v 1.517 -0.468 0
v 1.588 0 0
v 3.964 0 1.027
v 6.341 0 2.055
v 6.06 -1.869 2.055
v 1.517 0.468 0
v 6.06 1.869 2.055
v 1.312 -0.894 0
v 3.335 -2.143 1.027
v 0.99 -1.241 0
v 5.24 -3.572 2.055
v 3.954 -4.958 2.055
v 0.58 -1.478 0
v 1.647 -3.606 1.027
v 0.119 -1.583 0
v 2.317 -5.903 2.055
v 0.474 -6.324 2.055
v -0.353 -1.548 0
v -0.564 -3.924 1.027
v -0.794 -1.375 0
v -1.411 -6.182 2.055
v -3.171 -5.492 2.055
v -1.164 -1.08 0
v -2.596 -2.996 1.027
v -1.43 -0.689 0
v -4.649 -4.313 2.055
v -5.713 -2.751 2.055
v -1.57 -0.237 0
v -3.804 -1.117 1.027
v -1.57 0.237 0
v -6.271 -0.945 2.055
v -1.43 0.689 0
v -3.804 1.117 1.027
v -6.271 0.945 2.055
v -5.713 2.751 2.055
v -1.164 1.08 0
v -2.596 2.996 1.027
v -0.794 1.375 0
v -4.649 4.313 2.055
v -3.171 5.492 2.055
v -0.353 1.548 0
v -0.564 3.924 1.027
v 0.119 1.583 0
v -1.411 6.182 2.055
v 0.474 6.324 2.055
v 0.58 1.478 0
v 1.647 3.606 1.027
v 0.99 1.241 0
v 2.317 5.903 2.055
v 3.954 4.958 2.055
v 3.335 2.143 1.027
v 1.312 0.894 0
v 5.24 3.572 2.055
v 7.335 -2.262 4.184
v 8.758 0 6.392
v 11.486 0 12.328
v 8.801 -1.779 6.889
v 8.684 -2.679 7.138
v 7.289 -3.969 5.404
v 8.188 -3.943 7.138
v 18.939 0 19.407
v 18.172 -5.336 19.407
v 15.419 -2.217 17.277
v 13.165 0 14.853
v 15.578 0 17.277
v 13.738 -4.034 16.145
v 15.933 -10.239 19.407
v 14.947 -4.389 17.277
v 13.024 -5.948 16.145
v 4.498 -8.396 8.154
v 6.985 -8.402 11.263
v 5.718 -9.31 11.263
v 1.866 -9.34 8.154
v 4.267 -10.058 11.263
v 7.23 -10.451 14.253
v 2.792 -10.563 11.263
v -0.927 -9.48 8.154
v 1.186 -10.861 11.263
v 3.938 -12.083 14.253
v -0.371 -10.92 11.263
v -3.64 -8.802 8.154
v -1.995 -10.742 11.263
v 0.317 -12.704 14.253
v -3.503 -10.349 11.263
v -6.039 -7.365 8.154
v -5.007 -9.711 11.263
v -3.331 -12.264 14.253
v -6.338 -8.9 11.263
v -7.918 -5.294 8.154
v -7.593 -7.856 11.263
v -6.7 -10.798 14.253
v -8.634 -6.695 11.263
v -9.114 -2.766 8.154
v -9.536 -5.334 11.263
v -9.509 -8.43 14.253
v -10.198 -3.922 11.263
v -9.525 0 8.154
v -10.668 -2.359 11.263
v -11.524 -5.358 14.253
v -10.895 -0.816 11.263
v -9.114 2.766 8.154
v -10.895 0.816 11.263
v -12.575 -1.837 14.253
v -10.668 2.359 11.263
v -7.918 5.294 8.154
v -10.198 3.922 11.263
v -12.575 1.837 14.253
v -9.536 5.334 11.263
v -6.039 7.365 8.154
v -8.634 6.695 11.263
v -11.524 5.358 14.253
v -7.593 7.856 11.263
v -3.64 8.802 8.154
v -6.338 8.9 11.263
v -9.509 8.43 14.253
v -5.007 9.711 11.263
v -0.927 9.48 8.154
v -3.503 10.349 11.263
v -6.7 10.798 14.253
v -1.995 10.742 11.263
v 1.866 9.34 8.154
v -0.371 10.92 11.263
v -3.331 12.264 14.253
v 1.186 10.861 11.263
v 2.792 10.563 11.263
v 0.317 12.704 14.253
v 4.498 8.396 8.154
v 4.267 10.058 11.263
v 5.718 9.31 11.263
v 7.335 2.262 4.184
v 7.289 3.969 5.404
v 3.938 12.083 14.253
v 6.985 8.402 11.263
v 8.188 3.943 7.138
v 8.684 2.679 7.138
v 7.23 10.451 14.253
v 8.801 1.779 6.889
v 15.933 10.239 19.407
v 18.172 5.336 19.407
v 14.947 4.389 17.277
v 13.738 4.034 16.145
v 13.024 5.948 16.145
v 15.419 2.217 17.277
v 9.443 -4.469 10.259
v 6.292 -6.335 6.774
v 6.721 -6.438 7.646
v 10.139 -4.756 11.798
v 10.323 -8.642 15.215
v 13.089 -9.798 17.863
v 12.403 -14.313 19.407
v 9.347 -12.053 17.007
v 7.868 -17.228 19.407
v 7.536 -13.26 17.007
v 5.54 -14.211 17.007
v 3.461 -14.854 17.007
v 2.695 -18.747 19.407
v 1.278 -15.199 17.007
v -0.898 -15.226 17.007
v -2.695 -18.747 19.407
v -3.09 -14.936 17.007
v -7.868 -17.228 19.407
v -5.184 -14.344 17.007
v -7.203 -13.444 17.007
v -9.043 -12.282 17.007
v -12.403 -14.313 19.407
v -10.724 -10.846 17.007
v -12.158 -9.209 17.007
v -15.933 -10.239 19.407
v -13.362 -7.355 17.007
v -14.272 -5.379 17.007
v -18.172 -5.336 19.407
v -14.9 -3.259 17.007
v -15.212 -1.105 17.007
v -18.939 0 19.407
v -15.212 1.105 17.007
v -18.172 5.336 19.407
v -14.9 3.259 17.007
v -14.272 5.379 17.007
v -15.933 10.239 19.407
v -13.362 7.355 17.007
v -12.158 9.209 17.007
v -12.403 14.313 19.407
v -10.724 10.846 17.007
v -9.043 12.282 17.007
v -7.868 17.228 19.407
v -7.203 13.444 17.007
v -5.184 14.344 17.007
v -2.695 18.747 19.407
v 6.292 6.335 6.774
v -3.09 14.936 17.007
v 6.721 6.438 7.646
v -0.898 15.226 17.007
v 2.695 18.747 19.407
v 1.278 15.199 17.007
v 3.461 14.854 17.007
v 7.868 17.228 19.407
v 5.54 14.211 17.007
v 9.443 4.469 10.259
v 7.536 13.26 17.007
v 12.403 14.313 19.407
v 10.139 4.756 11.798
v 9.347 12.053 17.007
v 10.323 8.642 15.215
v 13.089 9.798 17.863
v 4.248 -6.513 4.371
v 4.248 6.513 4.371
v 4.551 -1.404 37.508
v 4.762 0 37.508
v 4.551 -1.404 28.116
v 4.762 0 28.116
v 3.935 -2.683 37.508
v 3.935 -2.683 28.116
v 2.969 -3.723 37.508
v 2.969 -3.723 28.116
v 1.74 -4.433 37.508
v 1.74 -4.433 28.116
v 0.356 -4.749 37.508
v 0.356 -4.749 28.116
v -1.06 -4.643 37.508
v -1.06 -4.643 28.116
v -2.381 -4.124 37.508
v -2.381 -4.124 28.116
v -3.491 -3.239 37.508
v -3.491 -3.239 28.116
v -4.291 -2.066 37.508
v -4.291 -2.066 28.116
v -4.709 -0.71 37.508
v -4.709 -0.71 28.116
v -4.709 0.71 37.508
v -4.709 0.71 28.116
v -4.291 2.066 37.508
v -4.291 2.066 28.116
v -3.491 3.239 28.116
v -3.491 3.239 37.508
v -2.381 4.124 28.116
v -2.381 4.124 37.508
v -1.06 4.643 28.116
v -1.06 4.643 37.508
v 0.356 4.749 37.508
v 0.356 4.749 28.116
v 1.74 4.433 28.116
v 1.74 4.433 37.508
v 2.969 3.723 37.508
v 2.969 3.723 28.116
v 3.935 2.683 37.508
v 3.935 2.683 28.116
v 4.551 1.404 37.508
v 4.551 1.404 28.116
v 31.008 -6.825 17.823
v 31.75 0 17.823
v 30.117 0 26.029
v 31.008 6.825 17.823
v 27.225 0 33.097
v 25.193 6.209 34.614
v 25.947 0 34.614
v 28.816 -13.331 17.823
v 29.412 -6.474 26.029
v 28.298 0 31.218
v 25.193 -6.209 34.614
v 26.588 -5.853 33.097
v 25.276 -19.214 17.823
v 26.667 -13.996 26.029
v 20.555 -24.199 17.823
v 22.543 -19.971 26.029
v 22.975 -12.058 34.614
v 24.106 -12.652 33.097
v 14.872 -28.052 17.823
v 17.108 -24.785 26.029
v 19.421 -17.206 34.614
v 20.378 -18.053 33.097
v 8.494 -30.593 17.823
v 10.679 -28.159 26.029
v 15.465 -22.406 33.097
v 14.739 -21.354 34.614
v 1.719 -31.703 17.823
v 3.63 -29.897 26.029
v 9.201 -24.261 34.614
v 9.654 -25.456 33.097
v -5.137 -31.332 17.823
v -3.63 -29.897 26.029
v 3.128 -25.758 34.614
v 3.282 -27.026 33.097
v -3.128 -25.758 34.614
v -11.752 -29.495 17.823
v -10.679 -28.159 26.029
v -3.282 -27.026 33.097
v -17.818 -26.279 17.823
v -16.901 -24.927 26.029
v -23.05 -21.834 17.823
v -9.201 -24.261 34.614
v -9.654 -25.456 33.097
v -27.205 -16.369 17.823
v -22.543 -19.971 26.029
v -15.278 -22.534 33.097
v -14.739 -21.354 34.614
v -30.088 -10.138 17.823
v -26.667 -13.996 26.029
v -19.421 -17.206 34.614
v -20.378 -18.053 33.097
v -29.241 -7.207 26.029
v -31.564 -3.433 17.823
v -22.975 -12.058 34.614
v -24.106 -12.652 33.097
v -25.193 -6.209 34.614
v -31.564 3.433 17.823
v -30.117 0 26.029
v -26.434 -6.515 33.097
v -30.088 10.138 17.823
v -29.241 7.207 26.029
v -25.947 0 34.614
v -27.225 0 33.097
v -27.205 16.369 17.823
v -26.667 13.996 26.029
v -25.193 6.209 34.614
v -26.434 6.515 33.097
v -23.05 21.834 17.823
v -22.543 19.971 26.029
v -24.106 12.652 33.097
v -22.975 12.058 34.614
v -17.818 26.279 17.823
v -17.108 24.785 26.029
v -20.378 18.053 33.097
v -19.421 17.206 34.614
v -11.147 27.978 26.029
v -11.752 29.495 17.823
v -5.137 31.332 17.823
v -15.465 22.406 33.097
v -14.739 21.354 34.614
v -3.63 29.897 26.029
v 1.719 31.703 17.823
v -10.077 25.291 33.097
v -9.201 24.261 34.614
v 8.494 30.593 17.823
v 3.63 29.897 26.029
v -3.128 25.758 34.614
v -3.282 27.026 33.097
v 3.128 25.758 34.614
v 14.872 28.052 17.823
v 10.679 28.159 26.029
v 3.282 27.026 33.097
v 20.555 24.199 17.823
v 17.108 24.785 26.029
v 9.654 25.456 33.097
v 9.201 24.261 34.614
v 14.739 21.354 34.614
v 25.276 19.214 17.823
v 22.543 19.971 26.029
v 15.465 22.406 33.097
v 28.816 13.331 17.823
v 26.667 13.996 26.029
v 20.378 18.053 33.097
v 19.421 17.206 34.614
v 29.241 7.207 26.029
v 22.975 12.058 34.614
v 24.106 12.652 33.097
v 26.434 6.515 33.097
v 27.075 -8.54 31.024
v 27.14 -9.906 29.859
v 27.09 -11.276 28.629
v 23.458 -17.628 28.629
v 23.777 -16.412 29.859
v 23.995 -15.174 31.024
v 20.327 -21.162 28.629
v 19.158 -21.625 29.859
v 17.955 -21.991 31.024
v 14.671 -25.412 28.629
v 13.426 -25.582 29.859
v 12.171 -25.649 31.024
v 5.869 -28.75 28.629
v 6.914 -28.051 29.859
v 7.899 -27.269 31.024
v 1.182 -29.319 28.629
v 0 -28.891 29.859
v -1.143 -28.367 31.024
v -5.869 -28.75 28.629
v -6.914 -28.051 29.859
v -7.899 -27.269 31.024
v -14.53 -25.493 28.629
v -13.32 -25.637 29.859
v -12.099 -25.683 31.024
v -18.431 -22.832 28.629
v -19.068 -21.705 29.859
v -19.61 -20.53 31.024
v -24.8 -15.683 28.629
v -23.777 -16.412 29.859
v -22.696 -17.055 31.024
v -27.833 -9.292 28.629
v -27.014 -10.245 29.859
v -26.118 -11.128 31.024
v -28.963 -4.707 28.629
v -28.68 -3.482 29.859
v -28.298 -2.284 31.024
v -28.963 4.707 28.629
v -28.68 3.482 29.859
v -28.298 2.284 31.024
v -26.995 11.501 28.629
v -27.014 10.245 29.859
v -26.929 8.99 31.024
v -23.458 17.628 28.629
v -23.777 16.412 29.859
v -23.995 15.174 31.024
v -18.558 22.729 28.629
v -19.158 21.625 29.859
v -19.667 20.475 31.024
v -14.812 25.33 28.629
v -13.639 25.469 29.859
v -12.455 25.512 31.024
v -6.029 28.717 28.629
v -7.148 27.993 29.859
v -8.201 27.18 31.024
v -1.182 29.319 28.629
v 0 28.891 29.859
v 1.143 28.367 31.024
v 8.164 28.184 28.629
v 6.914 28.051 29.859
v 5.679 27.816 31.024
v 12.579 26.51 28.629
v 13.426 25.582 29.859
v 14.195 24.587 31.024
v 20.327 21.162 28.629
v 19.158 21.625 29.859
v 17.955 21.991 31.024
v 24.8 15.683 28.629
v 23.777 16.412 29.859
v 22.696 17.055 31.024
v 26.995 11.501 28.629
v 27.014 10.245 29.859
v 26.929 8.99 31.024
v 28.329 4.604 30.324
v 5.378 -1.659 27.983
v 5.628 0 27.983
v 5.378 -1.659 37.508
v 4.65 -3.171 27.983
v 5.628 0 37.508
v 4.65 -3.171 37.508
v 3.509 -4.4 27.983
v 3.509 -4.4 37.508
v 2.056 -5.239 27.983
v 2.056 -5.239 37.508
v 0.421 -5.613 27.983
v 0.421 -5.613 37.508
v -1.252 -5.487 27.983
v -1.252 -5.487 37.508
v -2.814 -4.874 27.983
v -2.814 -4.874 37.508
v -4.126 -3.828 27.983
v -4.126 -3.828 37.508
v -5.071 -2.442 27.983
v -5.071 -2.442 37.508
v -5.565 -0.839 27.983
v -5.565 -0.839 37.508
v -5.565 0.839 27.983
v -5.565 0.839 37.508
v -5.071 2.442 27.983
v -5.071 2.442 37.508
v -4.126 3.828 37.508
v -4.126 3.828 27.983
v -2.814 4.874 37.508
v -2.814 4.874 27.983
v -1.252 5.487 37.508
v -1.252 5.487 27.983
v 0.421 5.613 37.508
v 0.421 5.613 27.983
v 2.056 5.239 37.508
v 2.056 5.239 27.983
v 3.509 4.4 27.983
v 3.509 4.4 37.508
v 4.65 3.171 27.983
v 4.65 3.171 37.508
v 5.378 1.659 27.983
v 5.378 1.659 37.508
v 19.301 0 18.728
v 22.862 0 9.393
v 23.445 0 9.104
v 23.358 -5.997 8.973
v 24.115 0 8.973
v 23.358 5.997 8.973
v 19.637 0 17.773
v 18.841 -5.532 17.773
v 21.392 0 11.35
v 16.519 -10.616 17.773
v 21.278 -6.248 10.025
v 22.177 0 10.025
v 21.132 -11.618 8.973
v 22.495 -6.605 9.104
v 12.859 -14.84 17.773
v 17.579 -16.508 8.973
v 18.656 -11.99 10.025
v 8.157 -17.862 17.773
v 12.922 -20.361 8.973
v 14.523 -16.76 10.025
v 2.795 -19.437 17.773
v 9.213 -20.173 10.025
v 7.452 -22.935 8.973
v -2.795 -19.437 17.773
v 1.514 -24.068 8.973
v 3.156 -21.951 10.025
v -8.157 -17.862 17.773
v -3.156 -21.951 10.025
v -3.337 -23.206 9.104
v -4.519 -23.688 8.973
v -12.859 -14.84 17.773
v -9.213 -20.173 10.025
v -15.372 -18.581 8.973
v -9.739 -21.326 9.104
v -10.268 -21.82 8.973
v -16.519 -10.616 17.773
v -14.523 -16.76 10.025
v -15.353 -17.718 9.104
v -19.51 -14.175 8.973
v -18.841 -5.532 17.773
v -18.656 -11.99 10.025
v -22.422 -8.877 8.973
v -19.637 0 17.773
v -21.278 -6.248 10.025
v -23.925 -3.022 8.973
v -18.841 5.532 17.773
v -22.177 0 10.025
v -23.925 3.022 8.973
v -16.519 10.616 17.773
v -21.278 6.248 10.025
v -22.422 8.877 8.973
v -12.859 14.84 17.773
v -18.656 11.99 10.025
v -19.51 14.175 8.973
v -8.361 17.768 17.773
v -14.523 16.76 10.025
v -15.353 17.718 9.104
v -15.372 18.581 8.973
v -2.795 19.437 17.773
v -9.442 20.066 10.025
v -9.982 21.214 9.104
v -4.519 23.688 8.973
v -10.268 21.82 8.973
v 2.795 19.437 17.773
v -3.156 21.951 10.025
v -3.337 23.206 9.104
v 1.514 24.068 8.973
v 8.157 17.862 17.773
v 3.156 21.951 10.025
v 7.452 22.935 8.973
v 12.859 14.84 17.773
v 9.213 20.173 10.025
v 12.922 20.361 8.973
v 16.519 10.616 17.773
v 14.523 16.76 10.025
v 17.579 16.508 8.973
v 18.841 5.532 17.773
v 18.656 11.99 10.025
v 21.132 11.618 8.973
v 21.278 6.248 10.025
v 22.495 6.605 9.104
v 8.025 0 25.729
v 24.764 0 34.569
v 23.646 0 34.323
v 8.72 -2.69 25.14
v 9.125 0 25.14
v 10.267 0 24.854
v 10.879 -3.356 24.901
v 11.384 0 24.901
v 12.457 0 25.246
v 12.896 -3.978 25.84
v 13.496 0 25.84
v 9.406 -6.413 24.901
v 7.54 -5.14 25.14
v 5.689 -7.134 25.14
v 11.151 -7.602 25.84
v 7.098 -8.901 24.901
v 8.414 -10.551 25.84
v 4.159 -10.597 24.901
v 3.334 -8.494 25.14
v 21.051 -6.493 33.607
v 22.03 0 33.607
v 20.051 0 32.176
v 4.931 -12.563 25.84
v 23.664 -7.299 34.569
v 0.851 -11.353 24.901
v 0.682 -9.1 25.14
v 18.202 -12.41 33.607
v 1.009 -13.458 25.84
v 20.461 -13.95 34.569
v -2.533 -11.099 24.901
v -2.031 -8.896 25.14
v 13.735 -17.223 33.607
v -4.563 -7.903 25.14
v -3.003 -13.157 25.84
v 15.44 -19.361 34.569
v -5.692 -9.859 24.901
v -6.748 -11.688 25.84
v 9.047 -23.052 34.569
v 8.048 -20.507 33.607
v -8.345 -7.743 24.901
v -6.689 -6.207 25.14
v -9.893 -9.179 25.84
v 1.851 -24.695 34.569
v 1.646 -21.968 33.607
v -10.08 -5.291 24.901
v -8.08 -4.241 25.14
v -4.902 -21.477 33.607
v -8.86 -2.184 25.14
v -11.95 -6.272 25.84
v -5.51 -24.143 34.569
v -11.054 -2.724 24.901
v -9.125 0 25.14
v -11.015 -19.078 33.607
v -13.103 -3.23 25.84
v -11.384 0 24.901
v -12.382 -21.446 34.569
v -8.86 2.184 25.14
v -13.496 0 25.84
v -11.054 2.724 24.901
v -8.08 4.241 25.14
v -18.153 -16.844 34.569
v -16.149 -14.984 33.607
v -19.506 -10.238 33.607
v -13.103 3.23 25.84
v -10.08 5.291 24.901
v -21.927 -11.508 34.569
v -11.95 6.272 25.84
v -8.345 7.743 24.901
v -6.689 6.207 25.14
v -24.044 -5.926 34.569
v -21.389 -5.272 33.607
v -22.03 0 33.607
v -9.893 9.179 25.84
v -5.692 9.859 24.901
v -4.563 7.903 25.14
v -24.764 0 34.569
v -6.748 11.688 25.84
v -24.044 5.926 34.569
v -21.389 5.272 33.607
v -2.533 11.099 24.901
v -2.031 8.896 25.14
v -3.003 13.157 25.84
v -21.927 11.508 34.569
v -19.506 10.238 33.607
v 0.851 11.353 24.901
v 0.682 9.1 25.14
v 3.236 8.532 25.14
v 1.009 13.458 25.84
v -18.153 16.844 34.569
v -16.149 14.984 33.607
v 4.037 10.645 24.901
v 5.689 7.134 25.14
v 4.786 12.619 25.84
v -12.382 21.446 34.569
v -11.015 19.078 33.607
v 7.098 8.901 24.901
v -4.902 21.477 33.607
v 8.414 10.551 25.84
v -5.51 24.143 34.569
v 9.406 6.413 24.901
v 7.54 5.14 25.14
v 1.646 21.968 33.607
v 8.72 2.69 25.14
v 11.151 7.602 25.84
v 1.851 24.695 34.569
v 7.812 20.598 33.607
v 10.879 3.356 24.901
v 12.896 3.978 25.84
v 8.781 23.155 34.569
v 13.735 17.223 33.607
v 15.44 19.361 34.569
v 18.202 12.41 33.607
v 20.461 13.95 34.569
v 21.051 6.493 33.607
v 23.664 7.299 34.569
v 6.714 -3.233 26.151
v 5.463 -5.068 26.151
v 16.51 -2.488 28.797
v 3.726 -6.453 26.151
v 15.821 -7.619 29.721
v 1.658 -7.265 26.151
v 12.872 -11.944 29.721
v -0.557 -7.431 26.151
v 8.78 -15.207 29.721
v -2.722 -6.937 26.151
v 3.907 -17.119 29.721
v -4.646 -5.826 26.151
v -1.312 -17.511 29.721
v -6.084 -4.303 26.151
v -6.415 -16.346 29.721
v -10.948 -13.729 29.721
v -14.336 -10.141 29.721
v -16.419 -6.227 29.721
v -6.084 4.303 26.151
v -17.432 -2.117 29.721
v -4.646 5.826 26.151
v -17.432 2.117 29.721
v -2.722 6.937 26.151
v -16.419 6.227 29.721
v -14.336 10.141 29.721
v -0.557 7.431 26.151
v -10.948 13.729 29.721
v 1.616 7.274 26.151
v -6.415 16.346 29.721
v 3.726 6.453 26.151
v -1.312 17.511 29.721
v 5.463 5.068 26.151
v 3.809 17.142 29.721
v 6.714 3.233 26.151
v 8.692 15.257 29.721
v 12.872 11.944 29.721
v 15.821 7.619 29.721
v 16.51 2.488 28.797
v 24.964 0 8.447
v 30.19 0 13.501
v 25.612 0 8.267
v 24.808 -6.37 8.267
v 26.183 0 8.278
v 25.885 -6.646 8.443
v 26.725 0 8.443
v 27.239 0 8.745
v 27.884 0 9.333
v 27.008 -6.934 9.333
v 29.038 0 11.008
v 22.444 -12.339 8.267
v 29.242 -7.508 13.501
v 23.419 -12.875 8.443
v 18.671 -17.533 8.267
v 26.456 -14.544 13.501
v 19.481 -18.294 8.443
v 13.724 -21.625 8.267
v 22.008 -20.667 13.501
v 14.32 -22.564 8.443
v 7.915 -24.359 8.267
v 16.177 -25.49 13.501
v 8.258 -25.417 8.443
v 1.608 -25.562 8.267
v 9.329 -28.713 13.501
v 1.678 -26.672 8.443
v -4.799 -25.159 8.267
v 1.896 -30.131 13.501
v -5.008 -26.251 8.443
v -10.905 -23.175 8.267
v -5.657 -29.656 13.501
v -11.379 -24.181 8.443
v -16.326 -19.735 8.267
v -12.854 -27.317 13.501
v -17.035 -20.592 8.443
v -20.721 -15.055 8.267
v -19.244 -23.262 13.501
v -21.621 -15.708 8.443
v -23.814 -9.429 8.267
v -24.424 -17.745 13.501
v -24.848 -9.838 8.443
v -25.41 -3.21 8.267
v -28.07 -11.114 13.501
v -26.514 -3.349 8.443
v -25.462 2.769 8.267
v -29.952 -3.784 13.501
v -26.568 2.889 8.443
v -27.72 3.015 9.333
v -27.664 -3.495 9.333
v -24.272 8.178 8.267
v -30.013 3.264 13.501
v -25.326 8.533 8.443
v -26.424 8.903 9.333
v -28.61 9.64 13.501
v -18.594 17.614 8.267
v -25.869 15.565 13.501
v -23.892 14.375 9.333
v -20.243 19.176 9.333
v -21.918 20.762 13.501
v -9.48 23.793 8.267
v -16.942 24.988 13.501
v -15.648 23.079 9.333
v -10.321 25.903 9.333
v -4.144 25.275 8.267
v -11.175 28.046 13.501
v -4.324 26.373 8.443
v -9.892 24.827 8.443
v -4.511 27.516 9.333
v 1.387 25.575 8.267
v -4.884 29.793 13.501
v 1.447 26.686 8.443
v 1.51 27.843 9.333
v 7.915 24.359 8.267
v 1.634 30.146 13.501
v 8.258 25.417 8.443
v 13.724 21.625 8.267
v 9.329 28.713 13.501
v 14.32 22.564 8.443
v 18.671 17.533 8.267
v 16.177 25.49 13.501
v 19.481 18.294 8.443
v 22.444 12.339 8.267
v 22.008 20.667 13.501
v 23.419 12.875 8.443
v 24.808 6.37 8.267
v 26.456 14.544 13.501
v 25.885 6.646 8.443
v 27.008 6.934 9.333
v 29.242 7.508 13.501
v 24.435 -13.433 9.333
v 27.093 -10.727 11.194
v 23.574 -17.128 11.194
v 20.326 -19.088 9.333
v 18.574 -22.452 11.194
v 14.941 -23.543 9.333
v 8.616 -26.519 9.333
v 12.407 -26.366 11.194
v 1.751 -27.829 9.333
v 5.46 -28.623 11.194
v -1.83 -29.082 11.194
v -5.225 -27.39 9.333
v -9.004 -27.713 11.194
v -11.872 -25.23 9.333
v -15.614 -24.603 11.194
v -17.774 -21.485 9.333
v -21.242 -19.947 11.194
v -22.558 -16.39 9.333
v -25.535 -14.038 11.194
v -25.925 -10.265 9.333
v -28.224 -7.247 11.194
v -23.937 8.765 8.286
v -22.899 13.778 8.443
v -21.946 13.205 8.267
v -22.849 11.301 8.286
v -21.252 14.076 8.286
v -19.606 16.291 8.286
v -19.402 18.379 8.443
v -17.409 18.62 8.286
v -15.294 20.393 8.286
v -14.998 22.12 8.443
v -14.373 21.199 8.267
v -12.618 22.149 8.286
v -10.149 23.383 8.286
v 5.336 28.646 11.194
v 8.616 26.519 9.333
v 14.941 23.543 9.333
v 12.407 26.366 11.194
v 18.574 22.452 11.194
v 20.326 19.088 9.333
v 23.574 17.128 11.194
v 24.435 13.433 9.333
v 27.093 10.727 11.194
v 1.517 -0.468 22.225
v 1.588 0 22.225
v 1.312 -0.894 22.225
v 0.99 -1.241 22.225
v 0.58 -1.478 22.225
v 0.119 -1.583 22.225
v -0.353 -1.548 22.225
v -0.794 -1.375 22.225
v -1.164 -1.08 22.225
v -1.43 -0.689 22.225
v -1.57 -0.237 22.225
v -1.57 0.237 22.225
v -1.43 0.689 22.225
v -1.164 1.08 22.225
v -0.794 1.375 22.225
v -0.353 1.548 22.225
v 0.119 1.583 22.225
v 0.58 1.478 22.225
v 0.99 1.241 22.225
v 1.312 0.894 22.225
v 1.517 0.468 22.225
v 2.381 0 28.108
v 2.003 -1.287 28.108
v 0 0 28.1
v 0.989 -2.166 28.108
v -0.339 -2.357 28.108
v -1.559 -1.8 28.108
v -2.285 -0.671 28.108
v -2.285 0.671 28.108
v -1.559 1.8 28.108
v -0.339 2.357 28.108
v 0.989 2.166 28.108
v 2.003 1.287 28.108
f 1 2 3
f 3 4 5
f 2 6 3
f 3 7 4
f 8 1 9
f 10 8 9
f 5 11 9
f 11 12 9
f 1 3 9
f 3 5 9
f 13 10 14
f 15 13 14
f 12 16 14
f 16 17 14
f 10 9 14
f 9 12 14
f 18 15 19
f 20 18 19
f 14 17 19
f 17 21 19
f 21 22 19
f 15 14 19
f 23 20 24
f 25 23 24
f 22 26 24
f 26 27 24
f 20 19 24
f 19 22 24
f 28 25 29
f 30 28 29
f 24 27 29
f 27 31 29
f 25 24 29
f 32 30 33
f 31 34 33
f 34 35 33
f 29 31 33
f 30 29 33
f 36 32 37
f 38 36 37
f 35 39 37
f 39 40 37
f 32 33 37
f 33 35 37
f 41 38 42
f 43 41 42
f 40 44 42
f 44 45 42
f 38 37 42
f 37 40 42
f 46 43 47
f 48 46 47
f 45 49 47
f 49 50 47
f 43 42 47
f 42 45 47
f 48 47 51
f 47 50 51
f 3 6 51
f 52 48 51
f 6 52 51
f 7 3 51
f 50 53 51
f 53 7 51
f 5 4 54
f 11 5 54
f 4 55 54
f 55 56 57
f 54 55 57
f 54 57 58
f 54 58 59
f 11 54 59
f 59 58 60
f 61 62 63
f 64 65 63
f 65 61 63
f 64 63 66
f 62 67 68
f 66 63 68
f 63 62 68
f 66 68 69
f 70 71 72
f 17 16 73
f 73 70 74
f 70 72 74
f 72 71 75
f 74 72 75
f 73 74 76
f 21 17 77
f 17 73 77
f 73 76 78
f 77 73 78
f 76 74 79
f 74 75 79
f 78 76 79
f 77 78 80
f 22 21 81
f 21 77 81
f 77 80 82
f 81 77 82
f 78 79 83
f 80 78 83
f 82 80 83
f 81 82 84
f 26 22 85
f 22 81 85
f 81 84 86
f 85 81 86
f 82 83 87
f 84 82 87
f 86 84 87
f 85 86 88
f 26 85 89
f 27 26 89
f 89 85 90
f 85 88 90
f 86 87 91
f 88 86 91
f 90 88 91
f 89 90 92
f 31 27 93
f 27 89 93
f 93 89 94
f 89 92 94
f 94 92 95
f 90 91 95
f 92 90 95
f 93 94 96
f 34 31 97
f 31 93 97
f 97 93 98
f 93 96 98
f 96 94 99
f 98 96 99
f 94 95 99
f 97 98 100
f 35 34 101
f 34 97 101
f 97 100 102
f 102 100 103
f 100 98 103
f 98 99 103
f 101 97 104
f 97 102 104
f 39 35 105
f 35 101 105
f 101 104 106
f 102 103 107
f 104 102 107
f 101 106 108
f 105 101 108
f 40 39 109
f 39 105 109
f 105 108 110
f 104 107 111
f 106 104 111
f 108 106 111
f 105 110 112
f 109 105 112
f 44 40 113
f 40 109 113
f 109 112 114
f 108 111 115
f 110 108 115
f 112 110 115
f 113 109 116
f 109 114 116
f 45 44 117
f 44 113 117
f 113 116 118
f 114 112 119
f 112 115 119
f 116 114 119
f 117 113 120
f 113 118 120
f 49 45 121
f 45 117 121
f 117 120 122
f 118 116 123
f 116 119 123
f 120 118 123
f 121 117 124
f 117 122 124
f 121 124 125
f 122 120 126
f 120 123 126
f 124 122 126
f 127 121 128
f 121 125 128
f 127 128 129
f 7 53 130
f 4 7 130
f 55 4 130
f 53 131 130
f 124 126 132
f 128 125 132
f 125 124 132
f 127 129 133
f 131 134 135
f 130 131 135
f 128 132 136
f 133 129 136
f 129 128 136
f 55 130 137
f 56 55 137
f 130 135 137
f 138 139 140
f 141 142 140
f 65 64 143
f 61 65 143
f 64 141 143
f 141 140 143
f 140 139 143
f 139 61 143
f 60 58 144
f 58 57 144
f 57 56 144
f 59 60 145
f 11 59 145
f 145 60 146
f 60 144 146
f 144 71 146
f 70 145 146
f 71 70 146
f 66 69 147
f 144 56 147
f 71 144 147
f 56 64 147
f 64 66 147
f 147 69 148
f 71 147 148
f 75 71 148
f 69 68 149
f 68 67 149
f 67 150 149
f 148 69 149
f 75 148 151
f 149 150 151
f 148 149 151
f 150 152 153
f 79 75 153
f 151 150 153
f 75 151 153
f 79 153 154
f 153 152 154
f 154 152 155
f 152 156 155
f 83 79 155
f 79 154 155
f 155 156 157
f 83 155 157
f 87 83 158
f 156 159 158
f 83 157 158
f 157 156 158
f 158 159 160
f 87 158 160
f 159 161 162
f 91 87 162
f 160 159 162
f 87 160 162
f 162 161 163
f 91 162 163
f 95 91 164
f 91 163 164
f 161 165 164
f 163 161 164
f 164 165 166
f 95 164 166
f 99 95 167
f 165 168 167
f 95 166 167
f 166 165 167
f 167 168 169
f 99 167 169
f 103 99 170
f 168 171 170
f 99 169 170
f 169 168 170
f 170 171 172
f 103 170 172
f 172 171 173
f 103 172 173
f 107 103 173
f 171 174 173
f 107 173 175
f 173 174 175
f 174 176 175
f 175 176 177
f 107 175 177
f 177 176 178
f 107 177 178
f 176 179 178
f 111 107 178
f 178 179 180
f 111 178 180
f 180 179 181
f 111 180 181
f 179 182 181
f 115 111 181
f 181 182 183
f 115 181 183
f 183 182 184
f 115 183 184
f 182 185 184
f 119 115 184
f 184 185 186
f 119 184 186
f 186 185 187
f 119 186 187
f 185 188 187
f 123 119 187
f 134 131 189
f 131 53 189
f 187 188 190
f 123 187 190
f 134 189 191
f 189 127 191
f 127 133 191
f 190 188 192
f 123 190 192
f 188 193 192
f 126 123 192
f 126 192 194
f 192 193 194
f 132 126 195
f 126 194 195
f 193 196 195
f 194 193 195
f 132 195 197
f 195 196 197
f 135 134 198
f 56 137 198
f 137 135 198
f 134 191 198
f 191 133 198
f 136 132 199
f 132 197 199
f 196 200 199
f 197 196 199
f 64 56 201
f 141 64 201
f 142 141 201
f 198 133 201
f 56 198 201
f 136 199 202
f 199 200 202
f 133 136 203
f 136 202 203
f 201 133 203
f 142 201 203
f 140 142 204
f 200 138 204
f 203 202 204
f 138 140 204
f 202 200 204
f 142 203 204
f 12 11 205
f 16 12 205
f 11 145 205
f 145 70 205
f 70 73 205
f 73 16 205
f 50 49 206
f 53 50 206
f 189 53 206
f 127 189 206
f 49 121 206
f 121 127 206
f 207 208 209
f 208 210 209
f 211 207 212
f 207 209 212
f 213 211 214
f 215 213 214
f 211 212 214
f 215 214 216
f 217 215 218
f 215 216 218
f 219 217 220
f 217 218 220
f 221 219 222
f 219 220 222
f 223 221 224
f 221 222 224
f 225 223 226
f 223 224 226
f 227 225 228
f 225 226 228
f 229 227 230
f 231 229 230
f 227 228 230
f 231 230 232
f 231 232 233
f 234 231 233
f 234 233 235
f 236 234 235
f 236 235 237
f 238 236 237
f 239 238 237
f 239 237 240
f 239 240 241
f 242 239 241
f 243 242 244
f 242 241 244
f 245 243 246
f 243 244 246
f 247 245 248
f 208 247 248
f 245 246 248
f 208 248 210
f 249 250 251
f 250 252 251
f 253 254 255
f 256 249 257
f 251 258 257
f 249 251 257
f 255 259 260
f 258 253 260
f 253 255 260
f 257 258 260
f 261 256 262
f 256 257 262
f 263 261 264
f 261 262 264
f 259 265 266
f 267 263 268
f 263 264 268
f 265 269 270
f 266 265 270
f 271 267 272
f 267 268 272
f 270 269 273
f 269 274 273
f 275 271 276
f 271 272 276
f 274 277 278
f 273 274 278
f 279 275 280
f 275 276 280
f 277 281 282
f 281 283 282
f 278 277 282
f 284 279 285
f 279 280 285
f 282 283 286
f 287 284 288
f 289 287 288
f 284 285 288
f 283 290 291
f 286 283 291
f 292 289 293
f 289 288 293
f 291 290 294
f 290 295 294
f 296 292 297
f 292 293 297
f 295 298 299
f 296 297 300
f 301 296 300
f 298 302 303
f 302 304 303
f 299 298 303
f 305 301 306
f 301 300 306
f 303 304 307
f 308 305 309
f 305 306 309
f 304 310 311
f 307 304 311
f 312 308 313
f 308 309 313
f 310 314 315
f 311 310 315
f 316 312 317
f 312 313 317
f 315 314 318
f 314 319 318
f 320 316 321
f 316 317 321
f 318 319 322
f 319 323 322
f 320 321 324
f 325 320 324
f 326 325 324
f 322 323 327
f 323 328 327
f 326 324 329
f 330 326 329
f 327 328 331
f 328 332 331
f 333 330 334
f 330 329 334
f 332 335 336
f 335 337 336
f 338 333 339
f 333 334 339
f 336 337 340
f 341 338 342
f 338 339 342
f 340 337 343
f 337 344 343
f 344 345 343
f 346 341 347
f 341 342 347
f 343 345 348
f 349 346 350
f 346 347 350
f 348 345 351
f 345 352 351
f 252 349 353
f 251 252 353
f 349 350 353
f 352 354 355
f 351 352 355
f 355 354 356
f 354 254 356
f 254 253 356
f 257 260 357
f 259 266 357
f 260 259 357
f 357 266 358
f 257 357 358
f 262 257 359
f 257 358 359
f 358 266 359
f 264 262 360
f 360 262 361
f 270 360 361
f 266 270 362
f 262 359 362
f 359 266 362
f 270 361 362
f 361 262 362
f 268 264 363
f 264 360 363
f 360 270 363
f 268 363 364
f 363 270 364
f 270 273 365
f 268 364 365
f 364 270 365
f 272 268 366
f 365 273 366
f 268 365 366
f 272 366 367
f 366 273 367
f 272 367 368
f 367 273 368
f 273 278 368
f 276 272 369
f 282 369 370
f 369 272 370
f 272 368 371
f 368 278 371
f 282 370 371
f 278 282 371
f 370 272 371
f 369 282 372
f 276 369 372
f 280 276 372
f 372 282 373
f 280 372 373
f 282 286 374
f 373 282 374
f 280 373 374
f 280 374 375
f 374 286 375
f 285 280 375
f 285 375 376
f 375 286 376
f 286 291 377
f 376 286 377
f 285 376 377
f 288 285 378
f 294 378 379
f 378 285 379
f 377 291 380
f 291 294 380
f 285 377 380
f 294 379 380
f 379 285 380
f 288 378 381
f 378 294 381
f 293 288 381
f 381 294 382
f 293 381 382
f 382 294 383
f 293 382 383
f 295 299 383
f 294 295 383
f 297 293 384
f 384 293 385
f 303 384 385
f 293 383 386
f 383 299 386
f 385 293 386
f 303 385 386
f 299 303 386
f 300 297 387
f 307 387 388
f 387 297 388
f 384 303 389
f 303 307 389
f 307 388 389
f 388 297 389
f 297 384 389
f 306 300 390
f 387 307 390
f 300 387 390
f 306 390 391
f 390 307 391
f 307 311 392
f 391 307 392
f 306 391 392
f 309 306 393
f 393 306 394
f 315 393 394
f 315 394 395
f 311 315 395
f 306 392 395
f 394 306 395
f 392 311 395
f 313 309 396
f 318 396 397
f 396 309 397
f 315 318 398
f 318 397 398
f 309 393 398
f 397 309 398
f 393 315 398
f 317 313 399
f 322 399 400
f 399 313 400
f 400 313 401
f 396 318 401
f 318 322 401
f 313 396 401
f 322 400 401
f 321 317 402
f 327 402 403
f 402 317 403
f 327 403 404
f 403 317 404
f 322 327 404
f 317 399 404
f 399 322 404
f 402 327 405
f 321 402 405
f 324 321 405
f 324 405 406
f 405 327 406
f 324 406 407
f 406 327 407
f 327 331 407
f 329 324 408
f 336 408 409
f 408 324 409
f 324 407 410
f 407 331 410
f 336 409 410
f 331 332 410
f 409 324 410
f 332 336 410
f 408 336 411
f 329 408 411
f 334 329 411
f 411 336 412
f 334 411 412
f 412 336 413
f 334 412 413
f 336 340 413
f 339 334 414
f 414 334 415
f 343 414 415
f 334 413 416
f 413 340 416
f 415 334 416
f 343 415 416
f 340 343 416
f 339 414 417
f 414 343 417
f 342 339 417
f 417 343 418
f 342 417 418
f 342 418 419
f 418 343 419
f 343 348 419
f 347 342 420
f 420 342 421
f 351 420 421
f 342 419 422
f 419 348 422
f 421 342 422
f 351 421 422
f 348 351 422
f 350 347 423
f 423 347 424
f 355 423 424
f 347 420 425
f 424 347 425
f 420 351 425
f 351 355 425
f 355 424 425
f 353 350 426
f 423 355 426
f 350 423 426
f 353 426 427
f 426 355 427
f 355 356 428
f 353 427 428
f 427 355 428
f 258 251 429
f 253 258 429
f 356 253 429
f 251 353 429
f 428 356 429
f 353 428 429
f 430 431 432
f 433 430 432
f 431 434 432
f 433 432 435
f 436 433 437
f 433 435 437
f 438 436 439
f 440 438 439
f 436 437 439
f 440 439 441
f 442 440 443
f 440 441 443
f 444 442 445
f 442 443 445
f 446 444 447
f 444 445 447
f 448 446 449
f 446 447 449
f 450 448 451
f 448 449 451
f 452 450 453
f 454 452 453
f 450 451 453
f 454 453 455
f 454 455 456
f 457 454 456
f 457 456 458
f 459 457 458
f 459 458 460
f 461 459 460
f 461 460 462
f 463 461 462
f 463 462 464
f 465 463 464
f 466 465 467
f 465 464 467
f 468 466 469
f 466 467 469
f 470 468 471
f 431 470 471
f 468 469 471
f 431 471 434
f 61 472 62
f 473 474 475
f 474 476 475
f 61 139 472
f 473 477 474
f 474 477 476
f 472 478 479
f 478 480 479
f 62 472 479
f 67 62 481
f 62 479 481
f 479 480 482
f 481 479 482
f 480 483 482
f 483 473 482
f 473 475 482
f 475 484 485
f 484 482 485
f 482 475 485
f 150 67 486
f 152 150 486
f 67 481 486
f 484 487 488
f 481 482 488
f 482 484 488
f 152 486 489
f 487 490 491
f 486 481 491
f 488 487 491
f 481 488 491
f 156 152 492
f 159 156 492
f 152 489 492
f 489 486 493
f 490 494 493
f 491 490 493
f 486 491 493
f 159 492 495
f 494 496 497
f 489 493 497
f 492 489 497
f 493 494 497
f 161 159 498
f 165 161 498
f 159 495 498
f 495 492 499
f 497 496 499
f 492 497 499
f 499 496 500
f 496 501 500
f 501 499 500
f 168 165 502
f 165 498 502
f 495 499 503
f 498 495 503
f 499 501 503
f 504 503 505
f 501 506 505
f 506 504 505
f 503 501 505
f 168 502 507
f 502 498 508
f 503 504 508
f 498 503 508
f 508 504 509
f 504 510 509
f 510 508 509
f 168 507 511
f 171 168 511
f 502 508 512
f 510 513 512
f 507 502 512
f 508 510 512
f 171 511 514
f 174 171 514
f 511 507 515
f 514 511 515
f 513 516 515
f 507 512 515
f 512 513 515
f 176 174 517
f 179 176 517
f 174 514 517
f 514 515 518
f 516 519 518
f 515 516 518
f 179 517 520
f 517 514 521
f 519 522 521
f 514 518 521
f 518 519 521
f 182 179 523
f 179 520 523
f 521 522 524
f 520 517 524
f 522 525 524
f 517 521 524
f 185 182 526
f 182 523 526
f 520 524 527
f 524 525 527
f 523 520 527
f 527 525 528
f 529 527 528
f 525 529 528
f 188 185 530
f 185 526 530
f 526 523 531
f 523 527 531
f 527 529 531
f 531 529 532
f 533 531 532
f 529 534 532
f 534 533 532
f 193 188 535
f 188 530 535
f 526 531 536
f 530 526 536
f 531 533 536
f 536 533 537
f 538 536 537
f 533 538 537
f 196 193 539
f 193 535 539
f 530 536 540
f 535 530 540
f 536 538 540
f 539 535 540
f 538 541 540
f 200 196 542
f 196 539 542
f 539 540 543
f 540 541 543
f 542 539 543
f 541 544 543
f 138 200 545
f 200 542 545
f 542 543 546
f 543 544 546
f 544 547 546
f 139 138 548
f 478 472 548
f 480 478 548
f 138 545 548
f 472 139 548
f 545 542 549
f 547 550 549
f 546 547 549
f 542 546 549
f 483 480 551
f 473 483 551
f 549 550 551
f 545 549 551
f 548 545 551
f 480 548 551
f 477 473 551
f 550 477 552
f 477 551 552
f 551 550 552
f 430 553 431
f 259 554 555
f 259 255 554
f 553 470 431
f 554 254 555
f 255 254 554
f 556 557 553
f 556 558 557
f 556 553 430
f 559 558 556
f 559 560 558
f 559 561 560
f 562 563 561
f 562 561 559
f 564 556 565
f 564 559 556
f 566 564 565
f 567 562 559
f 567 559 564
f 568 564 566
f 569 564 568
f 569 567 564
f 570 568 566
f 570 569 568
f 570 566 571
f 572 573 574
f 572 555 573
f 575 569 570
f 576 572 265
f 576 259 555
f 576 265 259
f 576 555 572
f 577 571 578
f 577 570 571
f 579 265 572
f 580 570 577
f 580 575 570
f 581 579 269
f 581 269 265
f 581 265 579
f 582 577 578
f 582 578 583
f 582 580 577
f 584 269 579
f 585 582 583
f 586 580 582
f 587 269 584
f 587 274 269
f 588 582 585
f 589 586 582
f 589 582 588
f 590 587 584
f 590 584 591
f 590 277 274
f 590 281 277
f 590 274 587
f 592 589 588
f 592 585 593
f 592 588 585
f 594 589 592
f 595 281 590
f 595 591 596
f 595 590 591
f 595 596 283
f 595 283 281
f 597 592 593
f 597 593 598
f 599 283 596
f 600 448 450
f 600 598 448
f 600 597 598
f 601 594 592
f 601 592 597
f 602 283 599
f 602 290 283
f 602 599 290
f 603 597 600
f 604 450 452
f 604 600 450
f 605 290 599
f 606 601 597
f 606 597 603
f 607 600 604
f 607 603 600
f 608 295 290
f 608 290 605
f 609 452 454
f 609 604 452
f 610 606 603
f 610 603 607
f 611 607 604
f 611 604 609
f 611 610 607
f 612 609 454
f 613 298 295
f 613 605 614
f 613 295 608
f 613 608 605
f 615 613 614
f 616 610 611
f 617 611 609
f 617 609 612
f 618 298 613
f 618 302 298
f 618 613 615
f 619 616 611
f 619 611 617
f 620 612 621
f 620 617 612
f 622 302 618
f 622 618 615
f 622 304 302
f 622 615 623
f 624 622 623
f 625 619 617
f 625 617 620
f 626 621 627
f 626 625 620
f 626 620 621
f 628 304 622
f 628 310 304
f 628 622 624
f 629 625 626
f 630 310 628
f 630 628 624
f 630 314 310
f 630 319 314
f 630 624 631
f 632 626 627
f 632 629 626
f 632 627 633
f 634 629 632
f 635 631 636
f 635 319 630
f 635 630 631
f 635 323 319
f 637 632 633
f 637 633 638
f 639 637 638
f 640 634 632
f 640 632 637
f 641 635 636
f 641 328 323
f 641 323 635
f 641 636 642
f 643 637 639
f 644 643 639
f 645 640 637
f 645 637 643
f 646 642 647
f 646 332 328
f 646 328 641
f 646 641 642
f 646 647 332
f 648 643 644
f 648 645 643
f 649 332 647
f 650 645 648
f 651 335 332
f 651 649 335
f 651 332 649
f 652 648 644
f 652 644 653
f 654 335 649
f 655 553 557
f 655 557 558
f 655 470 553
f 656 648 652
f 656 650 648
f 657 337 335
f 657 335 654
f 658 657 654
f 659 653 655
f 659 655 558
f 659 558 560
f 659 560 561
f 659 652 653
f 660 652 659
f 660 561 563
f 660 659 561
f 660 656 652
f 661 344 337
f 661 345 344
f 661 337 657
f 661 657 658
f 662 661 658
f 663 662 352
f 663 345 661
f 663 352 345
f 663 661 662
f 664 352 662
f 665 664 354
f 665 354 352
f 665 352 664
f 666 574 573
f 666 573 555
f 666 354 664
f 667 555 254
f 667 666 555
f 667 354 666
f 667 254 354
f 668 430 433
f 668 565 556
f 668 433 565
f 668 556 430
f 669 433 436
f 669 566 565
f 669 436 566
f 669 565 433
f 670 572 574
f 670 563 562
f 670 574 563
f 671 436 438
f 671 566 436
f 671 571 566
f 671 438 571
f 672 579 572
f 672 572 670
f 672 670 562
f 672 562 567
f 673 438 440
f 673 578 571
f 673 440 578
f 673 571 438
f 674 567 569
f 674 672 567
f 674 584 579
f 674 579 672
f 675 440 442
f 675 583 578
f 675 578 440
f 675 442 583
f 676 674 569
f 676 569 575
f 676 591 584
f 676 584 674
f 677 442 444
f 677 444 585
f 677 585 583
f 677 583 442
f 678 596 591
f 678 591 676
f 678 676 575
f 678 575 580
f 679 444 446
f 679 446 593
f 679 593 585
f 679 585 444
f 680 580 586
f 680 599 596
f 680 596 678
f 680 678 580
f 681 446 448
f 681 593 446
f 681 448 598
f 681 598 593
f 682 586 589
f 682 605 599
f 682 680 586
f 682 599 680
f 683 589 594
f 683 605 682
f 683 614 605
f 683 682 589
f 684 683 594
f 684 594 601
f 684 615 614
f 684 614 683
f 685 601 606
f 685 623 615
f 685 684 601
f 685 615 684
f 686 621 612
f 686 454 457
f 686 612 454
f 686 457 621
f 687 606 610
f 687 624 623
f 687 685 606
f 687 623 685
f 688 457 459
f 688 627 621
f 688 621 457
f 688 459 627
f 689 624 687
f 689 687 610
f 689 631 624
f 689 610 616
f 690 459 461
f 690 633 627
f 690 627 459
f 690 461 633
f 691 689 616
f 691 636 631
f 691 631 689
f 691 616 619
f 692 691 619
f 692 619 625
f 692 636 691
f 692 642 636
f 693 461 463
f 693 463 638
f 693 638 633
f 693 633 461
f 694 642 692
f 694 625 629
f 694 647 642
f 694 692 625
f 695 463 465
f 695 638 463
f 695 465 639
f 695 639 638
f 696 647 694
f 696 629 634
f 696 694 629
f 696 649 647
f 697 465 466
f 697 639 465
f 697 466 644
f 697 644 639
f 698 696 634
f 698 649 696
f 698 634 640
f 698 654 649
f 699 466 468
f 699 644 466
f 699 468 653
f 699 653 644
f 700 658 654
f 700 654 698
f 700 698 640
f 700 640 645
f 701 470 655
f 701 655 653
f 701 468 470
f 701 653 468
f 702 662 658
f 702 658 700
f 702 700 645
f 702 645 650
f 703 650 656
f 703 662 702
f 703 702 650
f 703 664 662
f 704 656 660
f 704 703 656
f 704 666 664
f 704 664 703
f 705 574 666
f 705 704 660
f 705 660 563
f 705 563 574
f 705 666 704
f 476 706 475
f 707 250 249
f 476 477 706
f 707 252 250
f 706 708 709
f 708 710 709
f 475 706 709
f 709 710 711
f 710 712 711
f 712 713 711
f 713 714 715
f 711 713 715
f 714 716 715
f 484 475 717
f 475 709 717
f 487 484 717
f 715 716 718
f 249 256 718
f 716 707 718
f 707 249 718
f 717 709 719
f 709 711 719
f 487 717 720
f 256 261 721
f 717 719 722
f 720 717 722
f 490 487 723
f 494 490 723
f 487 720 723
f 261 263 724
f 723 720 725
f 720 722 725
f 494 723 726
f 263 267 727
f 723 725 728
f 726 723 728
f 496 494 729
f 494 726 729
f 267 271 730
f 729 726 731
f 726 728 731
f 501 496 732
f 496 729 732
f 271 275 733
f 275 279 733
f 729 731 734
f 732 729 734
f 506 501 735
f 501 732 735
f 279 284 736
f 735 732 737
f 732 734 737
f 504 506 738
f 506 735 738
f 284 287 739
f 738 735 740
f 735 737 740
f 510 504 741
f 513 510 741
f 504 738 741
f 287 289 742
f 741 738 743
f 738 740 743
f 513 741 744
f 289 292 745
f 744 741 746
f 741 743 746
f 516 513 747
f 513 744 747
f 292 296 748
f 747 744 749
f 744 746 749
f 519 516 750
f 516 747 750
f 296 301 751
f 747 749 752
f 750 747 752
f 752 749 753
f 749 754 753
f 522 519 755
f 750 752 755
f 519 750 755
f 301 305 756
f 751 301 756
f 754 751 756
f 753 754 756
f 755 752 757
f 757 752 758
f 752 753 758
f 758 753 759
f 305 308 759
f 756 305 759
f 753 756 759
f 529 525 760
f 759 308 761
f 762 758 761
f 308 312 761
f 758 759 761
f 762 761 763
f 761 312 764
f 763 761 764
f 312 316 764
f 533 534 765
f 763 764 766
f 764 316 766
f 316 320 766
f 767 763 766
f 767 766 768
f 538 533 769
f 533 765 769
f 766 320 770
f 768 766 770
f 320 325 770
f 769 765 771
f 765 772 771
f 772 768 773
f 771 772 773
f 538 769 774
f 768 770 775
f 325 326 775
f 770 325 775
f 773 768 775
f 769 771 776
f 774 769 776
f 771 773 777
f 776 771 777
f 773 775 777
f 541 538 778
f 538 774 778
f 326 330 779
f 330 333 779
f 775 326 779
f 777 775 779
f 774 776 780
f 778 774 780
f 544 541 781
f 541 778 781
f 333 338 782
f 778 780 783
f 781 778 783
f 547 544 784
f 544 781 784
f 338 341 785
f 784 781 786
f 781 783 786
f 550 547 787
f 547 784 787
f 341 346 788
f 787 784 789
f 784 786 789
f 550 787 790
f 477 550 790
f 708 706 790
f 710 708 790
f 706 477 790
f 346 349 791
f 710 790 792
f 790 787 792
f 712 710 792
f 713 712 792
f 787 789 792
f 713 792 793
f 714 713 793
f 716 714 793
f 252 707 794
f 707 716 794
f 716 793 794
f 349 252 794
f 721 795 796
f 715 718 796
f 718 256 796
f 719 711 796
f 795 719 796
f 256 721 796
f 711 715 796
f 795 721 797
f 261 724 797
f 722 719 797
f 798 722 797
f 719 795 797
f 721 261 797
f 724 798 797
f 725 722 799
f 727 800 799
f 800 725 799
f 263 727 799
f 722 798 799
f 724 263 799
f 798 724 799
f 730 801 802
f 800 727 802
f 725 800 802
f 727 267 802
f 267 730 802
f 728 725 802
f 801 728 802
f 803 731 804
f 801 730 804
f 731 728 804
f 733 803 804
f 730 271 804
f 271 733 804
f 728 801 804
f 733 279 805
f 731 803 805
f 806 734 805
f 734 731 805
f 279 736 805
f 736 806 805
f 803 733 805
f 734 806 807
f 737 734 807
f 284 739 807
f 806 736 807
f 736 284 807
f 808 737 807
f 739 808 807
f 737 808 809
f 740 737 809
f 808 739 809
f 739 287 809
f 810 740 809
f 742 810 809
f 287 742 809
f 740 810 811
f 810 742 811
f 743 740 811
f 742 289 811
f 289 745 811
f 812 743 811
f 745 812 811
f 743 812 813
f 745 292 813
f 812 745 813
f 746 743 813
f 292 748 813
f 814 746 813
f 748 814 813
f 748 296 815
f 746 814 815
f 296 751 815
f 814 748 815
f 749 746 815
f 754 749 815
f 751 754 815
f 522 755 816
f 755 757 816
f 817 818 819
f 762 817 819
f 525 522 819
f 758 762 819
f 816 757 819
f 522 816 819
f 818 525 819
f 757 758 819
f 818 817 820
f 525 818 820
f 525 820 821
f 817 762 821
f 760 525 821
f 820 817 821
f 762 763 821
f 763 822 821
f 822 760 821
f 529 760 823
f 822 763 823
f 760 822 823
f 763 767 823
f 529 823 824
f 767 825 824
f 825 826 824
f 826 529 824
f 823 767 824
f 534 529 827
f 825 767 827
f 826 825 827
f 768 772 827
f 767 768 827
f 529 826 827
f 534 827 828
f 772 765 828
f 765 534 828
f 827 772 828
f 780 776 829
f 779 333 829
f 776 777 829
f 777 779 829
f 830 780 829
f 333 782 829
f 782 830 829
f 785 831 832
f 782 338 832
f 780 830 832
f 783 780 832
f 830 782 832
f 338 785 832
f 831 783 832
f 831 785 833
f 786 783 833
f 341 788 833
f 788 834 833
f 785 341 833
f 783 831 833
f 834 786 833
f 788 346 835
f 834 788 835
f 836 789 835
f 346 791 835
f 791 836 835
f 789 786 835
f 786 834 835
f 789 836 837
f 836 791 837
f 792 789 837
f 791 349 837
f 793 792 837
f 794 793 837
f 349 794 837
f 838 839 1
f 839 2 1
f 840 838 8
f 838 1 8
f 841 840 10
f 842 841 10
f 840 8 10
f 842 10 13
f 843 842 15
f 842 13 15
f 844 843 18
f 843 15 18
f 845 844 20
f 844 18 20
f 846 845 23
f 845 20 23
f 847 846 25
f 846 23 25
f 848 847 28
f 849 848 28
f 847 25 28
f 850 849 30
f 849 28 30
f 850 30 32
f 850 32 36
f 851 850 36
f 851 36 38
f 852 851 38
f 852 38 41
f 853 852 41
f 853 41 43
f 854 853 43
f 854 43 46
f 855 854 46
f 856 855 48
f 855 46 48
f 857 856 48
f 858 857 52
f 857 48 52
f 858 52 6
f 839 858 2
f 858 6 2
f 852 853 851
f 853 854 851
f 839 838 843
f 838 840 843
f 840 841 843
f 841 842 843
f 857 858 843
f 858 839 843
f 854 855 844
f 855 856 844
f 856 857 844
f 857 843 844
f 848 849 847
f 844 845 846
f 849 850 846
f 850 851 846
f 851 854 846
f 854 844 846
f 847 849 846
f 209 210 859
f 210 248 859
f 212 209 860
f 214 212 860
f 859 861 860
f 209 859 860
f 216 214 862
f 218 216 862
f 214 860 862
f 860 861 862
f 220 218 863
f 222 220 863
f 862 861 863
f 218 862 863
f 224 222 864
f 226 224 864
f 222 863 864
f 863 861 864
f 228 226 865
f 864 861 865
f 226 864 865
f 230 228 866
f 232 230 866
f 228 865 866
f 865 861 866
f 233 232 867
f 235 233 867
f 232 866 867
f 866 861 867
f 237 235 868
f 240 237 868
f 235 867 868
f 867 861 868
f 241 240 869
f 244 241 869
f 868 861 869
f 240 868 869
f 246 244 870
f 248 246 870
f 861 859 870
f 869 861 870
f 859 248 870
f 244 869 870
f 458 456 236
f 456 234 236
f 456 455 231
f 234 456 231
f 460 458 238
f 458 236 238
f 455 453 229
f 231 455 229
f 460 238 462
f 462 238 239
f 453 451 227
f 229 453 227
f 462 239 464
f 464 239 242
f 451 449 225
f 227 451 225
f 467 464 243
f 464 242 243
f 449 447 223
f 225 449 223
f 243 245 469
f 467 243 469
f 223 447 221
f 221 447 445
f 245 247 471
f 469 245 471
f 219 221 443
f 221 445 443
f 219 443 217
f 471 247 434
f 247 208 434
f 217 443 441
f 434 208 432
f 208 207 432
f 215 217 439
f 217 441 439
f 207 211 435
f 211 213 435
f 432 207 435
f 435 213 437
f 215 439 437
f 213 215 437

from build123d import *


with BuildPart() as f1:
    # F0 (on Front) → F1 (revolve)
    with BuildSketch(Plane.XZ):
        with BuildLine():
            Line((0, 28.099686), (0, 22.225))
            Line((0, 22.225), (1.5875, 22.225))
            Line((1.5875, 22.225), (1.5875, 0))
            Line((1.5875, 0), (6.341451, 2.054848))
            add(Edge.make_bspline(
                [(6.341451, 2.054848), (10.540777, 7.838826), (10.168102, 15.041621), (18.939429, 19.406782)],
                knots=[0, 0, 0, 0, 21.442916, 21.442916, 21.442916, 21.442916], degree=3))
            add(Edge.make_bspline(
                [(18.939429, 19.406782), (20.556432, 17.054778), (20.286054, 9.215307), (24.11521, 8.97275)],
                knots=[0, 0, 0, 0, 11.64722, 11.64722, 11.64722, 11.64722], degree=3))
            add(Edge.make_bspline(
                [(24.11521, 8.97275), (28.155569, 5.717743), (30.453973, 14.342109), (31.75, 17.822972)],
                knots=[0, 0, 0, 0, 11.688303, 11.688303, 11.688303, 11.688303], degree=3))
            add(Edge.make_bspline(
                [(31.75, 17.822972), (30.803725, 23.435773), (29.518737, 31.255352), (25.946699, 34.613654)],
                knots=[0, 0, 0, 0, 17.765284, 17.765284, 17.765284, 17.765284], degree=3))
            add(Edge.make_bspline(
                [(5.628359, 27.982606), (14.003698, 17.968016), (17.236267, 35.081048), (25.946699, 34.613654)],
                knots=[0, 0, 0, 0, 21.373014, 21.373014, 21.373014, 21.373014], degree=3))
            Line((5.628359, 27.982606), (5.628359, 37.507606))
            Line((5.628359, 37.507606), (4.762472, 37.507606))
            Line((4.762472, 37.507606), (4.762472, 28.116011))
            Line((4.762472, 28.116011), (0, 28.099686))
        make_face()
    revolve(axis=Axis((0, 0, 14.049843), (0, 0, -1)))


solid = f1.part
